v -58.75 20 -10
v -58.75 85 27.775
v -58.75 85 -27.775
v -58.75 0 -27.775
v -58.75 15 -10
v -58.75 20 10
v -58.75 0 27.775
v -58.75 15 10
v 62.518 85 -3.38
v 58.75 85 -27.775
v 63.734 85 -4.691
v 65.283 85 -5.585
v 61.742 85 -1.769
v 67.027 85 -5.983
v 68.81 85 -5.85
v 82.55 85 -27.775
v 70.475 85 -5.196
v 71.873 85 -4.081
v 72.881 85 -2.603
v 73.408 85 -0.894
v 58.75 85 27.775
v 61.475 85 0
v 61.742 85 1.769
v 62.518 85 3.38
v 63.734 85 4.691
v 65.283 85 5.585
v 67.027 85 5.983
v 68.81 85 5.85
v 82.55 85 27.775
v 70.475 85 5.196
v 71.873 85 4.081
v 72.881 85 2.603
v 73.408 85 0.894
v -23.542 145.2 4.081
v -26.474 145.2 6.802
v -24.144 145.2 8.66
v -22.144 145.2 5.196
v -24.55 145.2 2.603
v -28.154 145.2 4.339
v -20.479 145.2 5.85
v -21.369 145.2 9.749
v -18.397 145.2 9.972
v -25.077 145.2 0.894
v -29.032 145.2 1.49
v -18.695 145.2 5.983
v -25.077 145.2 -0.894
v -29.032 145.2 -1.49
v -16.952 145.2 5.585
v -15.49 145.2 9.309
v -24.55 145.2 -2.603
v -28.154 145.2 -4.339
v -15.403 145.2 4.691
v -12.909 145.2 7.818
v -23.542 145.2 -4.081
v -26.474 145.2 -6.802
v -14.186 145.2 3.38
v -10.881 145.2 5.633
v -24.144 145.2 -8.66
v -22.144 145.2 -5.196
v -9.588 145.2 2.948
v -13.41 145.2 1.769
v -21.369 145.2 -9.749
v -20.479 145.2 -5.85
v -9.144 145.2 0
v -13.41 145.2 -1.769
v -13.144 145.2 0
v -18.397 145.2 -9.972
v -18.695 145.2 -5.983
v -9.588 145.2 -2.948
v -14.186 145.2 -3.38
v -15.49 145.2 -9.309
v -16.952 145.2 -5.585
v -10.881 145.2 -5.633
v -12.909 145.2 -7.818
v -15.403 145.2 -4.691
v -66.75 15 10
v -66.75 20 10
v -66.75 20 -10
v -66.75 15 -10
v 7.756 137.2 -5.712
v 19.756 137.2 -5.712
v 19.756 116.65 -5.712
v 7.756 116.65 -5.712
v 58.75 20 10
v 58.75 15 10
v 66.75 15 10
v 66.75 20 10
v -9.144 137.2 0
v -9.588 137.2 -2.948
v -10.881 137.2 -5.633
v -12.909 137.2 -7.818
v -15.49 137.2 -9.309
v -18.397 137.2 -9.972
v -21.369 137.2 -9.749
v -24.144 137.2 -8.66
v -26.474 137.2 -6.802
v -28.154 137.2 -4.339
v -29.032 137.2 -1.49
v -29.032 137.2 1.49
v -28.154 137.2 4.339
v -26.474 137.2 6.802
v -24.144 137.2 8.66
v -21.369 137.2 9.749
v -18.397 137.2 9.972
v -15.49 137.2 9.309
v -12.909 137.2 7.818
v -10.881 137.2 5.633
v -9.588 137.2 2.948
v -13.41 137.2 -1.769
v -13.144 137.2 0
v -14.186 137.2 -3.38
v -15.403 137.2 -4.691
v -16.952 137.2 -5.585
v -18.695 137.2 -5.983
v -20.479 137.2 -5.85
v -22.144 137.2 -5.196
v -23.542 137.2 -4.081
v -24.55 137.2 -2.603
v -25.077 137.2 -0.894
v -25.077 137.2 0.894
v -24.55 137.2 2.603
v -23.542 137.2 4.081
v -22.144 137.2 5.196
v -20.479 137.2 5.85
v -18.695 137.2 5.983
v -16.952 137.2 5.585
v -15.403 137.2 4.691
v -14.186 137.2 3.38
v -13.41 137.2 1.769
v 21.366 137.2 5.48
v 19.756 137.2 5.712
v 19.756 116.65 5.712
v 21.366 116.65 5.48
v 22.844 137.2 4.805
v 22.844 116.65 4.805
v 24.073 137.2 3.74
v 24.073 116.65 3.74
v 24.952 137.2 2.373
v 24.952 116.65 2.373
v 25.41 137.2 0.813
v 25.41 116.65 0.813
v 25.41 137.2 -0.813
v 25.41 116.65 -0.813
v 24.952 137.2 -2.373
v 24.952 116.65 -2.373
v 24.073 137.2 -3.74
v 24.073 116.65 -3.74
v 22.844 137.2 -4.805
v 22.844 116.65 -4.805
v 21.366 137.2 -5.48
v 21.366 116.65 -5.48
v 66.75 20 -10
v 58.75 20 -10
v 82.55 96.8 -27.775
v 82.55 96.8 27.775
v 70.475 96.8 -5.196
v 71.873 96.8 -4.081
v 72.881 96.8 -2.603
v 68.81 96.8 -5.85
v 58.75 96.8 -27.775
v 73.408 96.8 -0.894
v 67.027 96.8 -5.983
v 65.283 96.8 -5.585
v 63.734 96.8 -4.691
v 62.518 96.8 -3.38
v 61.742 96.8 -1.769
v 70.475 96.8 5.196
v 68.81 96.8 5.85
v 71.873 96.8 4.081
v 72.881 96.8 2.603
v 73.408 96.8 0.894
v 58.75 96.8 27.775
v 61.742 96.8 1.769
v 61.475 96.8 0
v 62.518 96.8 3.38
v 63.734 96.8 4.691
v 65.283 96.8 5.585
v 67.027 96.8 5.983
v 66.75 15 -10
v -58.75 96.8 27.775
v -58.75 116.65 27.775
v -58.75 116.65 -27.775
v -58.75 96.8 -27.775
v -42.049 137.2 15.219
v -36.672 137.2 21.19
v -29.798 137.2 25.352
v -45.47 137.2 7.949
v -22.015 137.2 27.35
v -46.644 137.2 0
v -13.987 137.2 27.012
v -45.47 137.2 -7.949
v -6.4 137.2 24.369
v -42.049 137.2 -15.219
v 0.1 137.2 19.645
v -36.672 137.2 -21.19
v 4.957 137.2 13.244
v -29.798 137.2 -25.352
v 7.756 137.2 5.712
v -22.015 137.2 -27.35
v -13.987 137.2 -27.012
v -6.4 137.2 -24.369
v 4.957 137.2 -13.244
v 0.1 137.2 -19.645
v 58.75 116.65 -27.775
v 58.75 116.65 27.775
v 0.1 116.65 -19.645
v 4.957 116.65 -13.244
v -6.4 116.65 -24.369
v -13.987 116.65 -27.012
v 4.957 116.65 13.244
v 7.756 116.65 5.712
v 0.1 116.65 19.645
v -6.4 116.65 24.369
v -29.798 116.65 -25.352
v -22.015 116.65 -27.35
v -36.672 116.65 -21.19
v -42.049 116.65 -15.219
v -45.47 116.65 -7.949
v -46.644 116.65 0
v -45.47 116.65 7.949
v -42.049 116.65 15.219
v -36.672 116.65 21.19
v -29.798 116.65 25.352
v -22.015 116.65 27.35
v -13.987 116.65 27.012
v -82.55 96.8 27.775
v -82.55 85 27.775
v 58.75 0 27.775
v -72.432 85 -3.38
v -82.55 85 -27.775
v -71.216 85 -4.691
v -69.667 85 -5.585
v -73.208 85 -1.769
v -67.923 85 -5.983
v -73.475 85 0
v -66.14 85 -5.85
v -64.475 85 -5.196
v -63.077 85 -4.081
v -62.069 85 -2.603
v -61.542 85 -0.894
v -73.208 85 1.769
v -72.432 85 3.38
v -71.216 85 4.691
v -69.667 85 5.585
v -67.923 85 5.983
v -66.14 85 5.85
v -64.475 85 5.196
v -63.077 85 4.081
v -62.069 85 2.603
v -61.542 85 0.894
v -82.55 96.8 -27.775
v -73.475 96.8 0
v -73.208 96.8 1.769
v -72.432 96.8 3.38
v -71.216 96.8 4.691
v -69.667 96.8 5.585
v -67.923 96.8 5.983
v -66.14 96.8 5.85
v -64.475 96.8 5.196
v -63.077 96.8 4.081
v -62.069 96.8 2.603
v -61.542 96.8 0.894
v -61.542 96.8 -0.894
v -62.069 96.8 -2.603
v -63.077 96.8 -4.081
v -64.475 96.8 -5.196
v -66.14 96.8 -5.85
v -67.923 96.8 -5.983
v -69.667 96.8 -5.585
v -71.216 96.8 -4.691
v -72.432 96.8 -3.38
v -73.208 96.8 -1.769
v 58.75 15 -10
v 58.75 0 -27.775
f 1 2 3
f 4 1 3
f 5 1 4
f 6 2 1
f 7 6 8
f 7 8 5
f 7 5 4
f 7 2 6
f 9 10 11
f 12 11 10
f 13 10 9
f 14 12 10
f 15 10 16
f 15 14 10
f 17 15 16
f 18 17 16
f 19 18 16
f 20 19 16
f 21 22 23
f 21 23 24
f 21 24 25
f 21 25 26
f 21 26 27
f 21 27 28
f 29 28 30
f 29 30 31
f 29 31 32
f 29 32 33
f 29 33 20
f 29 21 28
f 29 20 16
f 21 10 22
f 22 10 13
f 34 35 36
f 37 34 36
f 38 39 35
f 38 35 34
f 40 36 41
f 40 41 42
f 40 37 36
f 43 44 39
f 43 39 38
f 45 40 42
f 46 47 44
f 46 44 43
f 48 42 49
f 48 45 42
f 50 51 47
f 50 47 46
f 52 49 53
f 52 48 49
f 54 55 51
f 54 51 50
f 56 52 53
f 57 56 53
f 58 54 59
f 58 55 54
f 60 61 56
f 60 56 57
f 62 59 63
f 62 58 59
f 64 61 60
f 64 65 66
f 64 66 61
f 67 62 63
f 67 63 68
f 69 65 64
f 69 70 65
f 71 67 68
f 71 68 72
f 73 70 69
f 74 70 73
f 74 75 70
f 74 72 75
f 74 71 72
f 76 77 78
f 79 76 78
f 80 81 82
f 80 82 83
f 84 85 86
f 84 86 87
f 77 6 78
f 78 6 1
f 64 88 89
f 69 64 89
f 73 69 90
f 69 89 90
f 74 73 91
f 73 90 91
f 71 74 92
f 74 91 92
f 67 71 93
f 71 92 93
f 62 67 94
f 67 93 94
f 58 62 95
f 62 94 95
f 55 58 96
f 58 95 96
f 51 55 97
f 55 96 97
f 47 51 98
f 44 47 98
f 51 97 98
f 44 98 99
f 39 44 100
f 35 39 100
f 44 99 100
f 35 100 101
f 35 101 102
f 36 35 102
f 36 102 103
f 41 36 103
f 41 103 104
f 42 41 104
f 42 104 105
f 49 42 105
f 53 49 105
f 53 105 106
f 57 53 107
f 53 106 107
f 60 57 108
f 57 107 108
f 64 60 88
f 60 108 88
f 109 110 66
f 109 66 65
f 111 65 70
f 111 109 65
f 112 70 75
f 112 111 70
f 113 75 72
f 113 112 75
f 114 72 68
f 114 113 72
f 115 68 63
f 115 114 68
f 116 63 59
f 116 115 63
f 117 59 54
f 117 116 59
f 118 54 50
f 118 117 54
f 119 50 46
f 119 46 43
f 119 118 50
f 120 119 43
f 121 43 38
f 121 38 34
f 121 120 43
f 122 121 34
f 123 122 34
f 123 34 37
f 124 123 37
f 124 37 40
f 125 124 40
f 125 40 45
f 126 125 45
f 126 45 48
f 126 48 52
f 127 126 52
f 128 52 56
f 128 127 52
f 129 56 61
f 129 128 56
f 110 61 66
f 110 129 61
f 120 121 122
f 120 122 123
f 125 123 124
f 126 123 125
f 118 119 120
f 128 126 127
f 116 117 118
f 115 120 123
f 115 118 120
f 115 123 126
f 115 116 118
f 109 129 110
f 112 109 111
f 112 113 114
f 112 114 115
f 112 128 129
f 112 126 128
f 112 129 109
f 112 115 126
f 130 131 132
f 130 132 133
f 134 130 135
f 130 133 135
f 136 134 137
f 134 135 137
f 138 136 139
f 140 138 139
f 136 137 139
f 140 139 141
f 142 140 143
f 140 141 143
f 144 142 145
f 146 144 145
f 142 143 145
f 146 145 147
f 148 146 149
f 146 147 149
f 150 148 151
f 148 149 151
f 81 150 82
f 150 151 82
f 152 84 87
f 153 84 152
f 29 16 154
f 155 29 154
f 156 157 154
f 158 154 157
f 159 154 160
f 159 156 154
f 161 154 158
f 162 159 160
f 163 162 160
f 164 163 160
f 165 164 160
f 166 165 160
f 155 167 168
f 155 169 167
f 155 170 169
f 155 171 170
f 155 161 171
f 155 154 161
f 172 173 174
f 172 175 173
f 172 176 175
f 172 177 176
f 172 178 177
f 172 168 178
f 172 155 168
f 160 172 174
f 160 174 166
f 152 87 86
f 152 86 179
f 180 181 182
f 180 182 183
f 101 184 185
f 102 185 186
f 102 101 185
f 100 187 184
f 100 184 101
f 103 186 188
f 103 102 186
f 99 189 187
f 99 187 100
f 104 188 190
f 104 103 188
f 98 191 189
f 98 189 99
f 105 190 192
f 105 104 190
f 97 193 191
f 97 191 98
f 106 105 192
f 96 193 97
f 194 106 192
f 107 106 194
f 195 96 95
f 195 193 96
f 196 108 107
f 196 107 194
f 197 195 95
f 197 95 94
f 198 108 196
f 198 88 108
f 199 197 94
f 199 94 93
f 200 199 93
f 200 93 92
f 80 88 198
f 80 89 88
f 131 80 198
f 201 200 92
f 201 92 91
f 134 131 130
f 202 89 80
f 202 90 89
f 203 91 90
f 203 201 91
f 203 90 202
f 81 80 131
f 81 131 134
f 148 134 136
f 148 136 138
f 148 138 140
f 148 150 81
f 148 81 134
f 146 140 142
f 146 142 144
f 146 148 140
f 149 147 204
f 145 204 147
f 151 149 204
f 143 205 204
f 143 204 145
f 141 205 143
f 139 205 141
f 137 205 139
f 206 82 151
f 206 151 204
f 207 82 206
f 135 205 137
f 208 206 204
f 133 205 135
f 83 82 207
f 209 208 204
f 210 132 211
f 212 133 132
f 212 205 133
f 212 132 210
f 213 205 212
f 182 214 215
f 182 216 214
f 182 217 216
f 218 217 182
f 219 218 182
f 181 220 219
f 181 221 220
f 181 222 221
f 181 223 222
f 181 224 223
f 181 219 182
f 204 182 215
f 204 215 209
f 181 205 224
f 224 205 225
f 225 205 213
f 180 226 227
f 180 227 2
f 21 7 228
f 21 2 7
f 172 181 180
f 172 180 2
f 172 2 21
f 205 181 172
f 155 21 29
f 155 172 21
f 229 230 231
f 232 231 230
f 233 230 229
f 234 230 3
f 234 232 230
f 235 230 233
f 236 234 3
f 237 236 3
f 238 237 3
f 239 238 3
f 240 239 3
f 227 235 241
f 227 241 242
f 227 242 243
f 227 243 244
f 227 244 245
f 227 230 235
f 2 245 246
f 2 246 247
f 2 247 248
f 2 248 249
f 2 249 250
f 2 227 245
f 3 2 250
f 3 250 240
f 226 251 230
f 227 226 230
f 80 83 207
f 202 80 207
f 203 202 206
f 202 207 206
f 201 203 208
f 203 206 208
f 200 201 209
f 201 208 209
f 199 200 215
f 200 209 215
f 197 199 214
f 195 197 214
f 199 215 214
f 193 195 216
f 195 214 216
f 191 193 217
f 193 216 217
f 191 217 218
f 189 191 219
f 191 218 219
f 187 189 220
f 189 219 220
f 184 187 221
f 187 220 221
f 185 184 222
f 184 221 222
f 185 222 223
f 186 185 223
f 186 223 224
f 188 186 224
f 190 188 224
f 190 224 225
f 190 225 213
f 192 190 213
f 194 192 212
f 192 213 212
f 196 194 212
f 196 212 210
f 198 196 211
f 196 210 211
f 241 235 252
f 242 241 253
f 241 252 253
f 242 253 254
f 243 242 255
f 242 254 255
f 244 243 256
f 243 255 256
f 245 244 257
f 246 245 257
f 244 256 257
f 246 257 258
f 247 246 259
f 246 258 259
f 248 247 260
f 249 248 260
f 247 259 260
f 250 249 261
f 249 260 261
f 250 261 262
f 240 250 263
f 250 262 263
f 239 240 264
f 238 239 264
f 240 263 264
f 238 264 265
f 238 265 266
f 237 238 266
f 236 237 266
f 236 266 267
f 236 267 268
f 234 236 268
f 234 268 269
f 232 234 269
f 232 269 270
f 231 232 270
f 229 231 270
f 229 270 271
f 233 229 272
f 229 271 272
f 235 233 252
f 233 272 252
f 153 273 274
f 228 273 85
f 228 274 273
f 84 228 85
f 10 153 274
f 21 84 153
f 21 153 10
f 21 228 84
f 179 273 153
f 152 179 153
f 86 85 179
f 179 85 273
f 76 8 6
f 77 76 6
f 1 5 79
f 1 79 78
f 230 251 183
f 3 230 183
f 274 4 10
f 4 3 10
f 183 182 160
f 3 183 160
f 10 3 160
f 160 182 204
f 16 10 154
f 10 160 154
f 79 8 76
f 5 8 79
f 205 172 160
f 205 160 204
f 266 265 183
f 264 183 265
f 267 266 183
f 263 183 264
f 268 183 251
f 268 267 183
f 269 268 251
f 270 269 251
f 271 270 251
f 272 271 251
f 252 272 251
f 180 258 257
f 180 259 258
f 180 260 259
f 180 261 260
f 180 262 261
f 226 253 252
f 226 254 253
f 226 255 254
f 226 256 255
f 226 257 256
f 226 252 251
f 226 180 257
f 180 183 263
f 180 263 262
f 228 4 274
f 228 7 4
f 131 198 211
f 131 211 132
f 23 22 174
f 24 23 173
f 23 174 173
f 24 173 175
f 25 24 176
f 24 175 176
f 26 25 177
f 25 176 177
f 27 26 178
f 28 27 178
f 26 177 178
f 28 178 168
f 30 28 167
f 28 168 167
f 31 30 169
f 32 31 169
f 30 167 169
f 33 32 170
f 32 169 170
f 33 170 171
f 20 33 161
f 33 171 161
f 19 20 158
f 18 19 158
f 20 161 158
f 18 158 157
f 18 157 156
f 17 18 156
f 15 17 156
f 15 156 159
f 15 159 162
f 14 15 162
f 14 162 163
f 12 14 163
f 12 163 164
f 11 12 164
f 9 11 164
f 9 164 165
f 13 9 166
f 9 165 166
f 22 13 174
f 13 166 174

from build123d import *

# Parameters (mm, degrees)
BOSS_EXTRUDE1_DEPTH = 27.775
SKETCH2_R           = 27.5
BOSS_EXTRUDE2_DEPTH = 20.55
SKETCH3_R           = 10
SKETCH3_R_2         = 6
EXTRUDE_THIN1_DEPTH = 8
SKETCH4_R           = 6
CUT_EXTRUDE2_DEPTH  = 11.8
SKETCH5_W           = 20
SKETCH5_H           = 5
BOSS_EXTRUDE3_DEPTH = 8


with BuildPart() as part:
    # Sketch1 → Boss-Extrude1 (new, symmetric)
    with BuildSketch(Plane.XY):
        Polygon((-58.75, 0), (58.75, 0), (58.75, 85), (82.55, 85), (82.55, 96.8), (58.75, 96.8), (58.75, 116.65), (-58.75, 116.65), (-58.75, 96.8), (-82.55, 96.8), (-82.55, 85), (-58.75, 85), align=None)
    extrude(amount=BOSS_EXTRUDE1_DEPTH, both=True)

    # Sketch2 → Boss-Extrude2 (add)
    with BuildSketch(Plane(origin=(0, 116.65, 0), x_dir=(1, 0, 0), z_dir=(0, 1, 0))):
        with BuildLine():
            Line((19.756400184, 5.711832399), (7.756400184, 5.711832399))
            ThreePointArc((7.756400184, 5.711832399), (8.205780532, 2.871615204), (8.356121921, 0))
            ThreePointArc((8.356121921, 0), (8.205780532, -2.871615204), (7.756400184, -5.711832399))
            Line((7.756400184, -5.711832399), (19.756400184, -5.711832399))
            ThreePointArc((19.756400184, -5.711832399), (25.468232583, 0), (19.756400184, 5.711832399))
        make_face()
        with Locations((-19.143878079, 0)):
            Circle(SKETCH2_R)
    extrude(amount=BOSS_EXTRUDE2_DEPTH)

    # Sketch3 → Extrude-Thin1 (add)
    with BuildSketch(Plane(origin=(0, 137.2, 0), x_dir=(1, 0, 0), z_dir=(0, 1, 0))):
        with Locations((-19.143878079, 0)):
            Circle(SKETCH3_R)
        with Locations((-19.143878079, 0)):
            Circle(SKETCH3_R_2, mode=Mode.SUBTRACT)
    extrude(amount=EXTRUDE_THIN1_DEPTH)

    # Sketch4 → Cut-Extrude2 (cut)
    with BuildSketch(Plane(origin=(0, 96.8, 0), x_dir=(1, 0, 0), z_dir=(0, 1, 0))):
        with Locations(Location((67.475, 0, 0), (0, 0, 180))):
            Circle(SKETCH4_R)
        with Locations(Location((-67.475, 0, 0), (0, 0, 180))):
            Circle(SKETCH4_R)
    extrude(amount=-CUT_EXTRUDE2_DEPTH, mode=Mode.SUBTRACT)

    # Sketch5 → Boss-Extrude3 (add)
    with BuildSketch(Plane(origin=(58.75, 0, 0), x_dir=(0, 0, -1), z_dir=(1, 0, 0))):
        with Locations((0, 17.5)):
            Rectangle(SKETCH5_W, SKETCH5_H)
    boss_extrude3 = extrude(amount=BOSS_EXTRUDE3_DEPTH)

    # Mirror1: Boss-Extrude3 across plane
    add(boss_extrude3.mirror(Plane(origin=(0, 0, 0), x_dir=(0, 0, 1), z_dir=(1, 0, 0))))


solid = part.part
